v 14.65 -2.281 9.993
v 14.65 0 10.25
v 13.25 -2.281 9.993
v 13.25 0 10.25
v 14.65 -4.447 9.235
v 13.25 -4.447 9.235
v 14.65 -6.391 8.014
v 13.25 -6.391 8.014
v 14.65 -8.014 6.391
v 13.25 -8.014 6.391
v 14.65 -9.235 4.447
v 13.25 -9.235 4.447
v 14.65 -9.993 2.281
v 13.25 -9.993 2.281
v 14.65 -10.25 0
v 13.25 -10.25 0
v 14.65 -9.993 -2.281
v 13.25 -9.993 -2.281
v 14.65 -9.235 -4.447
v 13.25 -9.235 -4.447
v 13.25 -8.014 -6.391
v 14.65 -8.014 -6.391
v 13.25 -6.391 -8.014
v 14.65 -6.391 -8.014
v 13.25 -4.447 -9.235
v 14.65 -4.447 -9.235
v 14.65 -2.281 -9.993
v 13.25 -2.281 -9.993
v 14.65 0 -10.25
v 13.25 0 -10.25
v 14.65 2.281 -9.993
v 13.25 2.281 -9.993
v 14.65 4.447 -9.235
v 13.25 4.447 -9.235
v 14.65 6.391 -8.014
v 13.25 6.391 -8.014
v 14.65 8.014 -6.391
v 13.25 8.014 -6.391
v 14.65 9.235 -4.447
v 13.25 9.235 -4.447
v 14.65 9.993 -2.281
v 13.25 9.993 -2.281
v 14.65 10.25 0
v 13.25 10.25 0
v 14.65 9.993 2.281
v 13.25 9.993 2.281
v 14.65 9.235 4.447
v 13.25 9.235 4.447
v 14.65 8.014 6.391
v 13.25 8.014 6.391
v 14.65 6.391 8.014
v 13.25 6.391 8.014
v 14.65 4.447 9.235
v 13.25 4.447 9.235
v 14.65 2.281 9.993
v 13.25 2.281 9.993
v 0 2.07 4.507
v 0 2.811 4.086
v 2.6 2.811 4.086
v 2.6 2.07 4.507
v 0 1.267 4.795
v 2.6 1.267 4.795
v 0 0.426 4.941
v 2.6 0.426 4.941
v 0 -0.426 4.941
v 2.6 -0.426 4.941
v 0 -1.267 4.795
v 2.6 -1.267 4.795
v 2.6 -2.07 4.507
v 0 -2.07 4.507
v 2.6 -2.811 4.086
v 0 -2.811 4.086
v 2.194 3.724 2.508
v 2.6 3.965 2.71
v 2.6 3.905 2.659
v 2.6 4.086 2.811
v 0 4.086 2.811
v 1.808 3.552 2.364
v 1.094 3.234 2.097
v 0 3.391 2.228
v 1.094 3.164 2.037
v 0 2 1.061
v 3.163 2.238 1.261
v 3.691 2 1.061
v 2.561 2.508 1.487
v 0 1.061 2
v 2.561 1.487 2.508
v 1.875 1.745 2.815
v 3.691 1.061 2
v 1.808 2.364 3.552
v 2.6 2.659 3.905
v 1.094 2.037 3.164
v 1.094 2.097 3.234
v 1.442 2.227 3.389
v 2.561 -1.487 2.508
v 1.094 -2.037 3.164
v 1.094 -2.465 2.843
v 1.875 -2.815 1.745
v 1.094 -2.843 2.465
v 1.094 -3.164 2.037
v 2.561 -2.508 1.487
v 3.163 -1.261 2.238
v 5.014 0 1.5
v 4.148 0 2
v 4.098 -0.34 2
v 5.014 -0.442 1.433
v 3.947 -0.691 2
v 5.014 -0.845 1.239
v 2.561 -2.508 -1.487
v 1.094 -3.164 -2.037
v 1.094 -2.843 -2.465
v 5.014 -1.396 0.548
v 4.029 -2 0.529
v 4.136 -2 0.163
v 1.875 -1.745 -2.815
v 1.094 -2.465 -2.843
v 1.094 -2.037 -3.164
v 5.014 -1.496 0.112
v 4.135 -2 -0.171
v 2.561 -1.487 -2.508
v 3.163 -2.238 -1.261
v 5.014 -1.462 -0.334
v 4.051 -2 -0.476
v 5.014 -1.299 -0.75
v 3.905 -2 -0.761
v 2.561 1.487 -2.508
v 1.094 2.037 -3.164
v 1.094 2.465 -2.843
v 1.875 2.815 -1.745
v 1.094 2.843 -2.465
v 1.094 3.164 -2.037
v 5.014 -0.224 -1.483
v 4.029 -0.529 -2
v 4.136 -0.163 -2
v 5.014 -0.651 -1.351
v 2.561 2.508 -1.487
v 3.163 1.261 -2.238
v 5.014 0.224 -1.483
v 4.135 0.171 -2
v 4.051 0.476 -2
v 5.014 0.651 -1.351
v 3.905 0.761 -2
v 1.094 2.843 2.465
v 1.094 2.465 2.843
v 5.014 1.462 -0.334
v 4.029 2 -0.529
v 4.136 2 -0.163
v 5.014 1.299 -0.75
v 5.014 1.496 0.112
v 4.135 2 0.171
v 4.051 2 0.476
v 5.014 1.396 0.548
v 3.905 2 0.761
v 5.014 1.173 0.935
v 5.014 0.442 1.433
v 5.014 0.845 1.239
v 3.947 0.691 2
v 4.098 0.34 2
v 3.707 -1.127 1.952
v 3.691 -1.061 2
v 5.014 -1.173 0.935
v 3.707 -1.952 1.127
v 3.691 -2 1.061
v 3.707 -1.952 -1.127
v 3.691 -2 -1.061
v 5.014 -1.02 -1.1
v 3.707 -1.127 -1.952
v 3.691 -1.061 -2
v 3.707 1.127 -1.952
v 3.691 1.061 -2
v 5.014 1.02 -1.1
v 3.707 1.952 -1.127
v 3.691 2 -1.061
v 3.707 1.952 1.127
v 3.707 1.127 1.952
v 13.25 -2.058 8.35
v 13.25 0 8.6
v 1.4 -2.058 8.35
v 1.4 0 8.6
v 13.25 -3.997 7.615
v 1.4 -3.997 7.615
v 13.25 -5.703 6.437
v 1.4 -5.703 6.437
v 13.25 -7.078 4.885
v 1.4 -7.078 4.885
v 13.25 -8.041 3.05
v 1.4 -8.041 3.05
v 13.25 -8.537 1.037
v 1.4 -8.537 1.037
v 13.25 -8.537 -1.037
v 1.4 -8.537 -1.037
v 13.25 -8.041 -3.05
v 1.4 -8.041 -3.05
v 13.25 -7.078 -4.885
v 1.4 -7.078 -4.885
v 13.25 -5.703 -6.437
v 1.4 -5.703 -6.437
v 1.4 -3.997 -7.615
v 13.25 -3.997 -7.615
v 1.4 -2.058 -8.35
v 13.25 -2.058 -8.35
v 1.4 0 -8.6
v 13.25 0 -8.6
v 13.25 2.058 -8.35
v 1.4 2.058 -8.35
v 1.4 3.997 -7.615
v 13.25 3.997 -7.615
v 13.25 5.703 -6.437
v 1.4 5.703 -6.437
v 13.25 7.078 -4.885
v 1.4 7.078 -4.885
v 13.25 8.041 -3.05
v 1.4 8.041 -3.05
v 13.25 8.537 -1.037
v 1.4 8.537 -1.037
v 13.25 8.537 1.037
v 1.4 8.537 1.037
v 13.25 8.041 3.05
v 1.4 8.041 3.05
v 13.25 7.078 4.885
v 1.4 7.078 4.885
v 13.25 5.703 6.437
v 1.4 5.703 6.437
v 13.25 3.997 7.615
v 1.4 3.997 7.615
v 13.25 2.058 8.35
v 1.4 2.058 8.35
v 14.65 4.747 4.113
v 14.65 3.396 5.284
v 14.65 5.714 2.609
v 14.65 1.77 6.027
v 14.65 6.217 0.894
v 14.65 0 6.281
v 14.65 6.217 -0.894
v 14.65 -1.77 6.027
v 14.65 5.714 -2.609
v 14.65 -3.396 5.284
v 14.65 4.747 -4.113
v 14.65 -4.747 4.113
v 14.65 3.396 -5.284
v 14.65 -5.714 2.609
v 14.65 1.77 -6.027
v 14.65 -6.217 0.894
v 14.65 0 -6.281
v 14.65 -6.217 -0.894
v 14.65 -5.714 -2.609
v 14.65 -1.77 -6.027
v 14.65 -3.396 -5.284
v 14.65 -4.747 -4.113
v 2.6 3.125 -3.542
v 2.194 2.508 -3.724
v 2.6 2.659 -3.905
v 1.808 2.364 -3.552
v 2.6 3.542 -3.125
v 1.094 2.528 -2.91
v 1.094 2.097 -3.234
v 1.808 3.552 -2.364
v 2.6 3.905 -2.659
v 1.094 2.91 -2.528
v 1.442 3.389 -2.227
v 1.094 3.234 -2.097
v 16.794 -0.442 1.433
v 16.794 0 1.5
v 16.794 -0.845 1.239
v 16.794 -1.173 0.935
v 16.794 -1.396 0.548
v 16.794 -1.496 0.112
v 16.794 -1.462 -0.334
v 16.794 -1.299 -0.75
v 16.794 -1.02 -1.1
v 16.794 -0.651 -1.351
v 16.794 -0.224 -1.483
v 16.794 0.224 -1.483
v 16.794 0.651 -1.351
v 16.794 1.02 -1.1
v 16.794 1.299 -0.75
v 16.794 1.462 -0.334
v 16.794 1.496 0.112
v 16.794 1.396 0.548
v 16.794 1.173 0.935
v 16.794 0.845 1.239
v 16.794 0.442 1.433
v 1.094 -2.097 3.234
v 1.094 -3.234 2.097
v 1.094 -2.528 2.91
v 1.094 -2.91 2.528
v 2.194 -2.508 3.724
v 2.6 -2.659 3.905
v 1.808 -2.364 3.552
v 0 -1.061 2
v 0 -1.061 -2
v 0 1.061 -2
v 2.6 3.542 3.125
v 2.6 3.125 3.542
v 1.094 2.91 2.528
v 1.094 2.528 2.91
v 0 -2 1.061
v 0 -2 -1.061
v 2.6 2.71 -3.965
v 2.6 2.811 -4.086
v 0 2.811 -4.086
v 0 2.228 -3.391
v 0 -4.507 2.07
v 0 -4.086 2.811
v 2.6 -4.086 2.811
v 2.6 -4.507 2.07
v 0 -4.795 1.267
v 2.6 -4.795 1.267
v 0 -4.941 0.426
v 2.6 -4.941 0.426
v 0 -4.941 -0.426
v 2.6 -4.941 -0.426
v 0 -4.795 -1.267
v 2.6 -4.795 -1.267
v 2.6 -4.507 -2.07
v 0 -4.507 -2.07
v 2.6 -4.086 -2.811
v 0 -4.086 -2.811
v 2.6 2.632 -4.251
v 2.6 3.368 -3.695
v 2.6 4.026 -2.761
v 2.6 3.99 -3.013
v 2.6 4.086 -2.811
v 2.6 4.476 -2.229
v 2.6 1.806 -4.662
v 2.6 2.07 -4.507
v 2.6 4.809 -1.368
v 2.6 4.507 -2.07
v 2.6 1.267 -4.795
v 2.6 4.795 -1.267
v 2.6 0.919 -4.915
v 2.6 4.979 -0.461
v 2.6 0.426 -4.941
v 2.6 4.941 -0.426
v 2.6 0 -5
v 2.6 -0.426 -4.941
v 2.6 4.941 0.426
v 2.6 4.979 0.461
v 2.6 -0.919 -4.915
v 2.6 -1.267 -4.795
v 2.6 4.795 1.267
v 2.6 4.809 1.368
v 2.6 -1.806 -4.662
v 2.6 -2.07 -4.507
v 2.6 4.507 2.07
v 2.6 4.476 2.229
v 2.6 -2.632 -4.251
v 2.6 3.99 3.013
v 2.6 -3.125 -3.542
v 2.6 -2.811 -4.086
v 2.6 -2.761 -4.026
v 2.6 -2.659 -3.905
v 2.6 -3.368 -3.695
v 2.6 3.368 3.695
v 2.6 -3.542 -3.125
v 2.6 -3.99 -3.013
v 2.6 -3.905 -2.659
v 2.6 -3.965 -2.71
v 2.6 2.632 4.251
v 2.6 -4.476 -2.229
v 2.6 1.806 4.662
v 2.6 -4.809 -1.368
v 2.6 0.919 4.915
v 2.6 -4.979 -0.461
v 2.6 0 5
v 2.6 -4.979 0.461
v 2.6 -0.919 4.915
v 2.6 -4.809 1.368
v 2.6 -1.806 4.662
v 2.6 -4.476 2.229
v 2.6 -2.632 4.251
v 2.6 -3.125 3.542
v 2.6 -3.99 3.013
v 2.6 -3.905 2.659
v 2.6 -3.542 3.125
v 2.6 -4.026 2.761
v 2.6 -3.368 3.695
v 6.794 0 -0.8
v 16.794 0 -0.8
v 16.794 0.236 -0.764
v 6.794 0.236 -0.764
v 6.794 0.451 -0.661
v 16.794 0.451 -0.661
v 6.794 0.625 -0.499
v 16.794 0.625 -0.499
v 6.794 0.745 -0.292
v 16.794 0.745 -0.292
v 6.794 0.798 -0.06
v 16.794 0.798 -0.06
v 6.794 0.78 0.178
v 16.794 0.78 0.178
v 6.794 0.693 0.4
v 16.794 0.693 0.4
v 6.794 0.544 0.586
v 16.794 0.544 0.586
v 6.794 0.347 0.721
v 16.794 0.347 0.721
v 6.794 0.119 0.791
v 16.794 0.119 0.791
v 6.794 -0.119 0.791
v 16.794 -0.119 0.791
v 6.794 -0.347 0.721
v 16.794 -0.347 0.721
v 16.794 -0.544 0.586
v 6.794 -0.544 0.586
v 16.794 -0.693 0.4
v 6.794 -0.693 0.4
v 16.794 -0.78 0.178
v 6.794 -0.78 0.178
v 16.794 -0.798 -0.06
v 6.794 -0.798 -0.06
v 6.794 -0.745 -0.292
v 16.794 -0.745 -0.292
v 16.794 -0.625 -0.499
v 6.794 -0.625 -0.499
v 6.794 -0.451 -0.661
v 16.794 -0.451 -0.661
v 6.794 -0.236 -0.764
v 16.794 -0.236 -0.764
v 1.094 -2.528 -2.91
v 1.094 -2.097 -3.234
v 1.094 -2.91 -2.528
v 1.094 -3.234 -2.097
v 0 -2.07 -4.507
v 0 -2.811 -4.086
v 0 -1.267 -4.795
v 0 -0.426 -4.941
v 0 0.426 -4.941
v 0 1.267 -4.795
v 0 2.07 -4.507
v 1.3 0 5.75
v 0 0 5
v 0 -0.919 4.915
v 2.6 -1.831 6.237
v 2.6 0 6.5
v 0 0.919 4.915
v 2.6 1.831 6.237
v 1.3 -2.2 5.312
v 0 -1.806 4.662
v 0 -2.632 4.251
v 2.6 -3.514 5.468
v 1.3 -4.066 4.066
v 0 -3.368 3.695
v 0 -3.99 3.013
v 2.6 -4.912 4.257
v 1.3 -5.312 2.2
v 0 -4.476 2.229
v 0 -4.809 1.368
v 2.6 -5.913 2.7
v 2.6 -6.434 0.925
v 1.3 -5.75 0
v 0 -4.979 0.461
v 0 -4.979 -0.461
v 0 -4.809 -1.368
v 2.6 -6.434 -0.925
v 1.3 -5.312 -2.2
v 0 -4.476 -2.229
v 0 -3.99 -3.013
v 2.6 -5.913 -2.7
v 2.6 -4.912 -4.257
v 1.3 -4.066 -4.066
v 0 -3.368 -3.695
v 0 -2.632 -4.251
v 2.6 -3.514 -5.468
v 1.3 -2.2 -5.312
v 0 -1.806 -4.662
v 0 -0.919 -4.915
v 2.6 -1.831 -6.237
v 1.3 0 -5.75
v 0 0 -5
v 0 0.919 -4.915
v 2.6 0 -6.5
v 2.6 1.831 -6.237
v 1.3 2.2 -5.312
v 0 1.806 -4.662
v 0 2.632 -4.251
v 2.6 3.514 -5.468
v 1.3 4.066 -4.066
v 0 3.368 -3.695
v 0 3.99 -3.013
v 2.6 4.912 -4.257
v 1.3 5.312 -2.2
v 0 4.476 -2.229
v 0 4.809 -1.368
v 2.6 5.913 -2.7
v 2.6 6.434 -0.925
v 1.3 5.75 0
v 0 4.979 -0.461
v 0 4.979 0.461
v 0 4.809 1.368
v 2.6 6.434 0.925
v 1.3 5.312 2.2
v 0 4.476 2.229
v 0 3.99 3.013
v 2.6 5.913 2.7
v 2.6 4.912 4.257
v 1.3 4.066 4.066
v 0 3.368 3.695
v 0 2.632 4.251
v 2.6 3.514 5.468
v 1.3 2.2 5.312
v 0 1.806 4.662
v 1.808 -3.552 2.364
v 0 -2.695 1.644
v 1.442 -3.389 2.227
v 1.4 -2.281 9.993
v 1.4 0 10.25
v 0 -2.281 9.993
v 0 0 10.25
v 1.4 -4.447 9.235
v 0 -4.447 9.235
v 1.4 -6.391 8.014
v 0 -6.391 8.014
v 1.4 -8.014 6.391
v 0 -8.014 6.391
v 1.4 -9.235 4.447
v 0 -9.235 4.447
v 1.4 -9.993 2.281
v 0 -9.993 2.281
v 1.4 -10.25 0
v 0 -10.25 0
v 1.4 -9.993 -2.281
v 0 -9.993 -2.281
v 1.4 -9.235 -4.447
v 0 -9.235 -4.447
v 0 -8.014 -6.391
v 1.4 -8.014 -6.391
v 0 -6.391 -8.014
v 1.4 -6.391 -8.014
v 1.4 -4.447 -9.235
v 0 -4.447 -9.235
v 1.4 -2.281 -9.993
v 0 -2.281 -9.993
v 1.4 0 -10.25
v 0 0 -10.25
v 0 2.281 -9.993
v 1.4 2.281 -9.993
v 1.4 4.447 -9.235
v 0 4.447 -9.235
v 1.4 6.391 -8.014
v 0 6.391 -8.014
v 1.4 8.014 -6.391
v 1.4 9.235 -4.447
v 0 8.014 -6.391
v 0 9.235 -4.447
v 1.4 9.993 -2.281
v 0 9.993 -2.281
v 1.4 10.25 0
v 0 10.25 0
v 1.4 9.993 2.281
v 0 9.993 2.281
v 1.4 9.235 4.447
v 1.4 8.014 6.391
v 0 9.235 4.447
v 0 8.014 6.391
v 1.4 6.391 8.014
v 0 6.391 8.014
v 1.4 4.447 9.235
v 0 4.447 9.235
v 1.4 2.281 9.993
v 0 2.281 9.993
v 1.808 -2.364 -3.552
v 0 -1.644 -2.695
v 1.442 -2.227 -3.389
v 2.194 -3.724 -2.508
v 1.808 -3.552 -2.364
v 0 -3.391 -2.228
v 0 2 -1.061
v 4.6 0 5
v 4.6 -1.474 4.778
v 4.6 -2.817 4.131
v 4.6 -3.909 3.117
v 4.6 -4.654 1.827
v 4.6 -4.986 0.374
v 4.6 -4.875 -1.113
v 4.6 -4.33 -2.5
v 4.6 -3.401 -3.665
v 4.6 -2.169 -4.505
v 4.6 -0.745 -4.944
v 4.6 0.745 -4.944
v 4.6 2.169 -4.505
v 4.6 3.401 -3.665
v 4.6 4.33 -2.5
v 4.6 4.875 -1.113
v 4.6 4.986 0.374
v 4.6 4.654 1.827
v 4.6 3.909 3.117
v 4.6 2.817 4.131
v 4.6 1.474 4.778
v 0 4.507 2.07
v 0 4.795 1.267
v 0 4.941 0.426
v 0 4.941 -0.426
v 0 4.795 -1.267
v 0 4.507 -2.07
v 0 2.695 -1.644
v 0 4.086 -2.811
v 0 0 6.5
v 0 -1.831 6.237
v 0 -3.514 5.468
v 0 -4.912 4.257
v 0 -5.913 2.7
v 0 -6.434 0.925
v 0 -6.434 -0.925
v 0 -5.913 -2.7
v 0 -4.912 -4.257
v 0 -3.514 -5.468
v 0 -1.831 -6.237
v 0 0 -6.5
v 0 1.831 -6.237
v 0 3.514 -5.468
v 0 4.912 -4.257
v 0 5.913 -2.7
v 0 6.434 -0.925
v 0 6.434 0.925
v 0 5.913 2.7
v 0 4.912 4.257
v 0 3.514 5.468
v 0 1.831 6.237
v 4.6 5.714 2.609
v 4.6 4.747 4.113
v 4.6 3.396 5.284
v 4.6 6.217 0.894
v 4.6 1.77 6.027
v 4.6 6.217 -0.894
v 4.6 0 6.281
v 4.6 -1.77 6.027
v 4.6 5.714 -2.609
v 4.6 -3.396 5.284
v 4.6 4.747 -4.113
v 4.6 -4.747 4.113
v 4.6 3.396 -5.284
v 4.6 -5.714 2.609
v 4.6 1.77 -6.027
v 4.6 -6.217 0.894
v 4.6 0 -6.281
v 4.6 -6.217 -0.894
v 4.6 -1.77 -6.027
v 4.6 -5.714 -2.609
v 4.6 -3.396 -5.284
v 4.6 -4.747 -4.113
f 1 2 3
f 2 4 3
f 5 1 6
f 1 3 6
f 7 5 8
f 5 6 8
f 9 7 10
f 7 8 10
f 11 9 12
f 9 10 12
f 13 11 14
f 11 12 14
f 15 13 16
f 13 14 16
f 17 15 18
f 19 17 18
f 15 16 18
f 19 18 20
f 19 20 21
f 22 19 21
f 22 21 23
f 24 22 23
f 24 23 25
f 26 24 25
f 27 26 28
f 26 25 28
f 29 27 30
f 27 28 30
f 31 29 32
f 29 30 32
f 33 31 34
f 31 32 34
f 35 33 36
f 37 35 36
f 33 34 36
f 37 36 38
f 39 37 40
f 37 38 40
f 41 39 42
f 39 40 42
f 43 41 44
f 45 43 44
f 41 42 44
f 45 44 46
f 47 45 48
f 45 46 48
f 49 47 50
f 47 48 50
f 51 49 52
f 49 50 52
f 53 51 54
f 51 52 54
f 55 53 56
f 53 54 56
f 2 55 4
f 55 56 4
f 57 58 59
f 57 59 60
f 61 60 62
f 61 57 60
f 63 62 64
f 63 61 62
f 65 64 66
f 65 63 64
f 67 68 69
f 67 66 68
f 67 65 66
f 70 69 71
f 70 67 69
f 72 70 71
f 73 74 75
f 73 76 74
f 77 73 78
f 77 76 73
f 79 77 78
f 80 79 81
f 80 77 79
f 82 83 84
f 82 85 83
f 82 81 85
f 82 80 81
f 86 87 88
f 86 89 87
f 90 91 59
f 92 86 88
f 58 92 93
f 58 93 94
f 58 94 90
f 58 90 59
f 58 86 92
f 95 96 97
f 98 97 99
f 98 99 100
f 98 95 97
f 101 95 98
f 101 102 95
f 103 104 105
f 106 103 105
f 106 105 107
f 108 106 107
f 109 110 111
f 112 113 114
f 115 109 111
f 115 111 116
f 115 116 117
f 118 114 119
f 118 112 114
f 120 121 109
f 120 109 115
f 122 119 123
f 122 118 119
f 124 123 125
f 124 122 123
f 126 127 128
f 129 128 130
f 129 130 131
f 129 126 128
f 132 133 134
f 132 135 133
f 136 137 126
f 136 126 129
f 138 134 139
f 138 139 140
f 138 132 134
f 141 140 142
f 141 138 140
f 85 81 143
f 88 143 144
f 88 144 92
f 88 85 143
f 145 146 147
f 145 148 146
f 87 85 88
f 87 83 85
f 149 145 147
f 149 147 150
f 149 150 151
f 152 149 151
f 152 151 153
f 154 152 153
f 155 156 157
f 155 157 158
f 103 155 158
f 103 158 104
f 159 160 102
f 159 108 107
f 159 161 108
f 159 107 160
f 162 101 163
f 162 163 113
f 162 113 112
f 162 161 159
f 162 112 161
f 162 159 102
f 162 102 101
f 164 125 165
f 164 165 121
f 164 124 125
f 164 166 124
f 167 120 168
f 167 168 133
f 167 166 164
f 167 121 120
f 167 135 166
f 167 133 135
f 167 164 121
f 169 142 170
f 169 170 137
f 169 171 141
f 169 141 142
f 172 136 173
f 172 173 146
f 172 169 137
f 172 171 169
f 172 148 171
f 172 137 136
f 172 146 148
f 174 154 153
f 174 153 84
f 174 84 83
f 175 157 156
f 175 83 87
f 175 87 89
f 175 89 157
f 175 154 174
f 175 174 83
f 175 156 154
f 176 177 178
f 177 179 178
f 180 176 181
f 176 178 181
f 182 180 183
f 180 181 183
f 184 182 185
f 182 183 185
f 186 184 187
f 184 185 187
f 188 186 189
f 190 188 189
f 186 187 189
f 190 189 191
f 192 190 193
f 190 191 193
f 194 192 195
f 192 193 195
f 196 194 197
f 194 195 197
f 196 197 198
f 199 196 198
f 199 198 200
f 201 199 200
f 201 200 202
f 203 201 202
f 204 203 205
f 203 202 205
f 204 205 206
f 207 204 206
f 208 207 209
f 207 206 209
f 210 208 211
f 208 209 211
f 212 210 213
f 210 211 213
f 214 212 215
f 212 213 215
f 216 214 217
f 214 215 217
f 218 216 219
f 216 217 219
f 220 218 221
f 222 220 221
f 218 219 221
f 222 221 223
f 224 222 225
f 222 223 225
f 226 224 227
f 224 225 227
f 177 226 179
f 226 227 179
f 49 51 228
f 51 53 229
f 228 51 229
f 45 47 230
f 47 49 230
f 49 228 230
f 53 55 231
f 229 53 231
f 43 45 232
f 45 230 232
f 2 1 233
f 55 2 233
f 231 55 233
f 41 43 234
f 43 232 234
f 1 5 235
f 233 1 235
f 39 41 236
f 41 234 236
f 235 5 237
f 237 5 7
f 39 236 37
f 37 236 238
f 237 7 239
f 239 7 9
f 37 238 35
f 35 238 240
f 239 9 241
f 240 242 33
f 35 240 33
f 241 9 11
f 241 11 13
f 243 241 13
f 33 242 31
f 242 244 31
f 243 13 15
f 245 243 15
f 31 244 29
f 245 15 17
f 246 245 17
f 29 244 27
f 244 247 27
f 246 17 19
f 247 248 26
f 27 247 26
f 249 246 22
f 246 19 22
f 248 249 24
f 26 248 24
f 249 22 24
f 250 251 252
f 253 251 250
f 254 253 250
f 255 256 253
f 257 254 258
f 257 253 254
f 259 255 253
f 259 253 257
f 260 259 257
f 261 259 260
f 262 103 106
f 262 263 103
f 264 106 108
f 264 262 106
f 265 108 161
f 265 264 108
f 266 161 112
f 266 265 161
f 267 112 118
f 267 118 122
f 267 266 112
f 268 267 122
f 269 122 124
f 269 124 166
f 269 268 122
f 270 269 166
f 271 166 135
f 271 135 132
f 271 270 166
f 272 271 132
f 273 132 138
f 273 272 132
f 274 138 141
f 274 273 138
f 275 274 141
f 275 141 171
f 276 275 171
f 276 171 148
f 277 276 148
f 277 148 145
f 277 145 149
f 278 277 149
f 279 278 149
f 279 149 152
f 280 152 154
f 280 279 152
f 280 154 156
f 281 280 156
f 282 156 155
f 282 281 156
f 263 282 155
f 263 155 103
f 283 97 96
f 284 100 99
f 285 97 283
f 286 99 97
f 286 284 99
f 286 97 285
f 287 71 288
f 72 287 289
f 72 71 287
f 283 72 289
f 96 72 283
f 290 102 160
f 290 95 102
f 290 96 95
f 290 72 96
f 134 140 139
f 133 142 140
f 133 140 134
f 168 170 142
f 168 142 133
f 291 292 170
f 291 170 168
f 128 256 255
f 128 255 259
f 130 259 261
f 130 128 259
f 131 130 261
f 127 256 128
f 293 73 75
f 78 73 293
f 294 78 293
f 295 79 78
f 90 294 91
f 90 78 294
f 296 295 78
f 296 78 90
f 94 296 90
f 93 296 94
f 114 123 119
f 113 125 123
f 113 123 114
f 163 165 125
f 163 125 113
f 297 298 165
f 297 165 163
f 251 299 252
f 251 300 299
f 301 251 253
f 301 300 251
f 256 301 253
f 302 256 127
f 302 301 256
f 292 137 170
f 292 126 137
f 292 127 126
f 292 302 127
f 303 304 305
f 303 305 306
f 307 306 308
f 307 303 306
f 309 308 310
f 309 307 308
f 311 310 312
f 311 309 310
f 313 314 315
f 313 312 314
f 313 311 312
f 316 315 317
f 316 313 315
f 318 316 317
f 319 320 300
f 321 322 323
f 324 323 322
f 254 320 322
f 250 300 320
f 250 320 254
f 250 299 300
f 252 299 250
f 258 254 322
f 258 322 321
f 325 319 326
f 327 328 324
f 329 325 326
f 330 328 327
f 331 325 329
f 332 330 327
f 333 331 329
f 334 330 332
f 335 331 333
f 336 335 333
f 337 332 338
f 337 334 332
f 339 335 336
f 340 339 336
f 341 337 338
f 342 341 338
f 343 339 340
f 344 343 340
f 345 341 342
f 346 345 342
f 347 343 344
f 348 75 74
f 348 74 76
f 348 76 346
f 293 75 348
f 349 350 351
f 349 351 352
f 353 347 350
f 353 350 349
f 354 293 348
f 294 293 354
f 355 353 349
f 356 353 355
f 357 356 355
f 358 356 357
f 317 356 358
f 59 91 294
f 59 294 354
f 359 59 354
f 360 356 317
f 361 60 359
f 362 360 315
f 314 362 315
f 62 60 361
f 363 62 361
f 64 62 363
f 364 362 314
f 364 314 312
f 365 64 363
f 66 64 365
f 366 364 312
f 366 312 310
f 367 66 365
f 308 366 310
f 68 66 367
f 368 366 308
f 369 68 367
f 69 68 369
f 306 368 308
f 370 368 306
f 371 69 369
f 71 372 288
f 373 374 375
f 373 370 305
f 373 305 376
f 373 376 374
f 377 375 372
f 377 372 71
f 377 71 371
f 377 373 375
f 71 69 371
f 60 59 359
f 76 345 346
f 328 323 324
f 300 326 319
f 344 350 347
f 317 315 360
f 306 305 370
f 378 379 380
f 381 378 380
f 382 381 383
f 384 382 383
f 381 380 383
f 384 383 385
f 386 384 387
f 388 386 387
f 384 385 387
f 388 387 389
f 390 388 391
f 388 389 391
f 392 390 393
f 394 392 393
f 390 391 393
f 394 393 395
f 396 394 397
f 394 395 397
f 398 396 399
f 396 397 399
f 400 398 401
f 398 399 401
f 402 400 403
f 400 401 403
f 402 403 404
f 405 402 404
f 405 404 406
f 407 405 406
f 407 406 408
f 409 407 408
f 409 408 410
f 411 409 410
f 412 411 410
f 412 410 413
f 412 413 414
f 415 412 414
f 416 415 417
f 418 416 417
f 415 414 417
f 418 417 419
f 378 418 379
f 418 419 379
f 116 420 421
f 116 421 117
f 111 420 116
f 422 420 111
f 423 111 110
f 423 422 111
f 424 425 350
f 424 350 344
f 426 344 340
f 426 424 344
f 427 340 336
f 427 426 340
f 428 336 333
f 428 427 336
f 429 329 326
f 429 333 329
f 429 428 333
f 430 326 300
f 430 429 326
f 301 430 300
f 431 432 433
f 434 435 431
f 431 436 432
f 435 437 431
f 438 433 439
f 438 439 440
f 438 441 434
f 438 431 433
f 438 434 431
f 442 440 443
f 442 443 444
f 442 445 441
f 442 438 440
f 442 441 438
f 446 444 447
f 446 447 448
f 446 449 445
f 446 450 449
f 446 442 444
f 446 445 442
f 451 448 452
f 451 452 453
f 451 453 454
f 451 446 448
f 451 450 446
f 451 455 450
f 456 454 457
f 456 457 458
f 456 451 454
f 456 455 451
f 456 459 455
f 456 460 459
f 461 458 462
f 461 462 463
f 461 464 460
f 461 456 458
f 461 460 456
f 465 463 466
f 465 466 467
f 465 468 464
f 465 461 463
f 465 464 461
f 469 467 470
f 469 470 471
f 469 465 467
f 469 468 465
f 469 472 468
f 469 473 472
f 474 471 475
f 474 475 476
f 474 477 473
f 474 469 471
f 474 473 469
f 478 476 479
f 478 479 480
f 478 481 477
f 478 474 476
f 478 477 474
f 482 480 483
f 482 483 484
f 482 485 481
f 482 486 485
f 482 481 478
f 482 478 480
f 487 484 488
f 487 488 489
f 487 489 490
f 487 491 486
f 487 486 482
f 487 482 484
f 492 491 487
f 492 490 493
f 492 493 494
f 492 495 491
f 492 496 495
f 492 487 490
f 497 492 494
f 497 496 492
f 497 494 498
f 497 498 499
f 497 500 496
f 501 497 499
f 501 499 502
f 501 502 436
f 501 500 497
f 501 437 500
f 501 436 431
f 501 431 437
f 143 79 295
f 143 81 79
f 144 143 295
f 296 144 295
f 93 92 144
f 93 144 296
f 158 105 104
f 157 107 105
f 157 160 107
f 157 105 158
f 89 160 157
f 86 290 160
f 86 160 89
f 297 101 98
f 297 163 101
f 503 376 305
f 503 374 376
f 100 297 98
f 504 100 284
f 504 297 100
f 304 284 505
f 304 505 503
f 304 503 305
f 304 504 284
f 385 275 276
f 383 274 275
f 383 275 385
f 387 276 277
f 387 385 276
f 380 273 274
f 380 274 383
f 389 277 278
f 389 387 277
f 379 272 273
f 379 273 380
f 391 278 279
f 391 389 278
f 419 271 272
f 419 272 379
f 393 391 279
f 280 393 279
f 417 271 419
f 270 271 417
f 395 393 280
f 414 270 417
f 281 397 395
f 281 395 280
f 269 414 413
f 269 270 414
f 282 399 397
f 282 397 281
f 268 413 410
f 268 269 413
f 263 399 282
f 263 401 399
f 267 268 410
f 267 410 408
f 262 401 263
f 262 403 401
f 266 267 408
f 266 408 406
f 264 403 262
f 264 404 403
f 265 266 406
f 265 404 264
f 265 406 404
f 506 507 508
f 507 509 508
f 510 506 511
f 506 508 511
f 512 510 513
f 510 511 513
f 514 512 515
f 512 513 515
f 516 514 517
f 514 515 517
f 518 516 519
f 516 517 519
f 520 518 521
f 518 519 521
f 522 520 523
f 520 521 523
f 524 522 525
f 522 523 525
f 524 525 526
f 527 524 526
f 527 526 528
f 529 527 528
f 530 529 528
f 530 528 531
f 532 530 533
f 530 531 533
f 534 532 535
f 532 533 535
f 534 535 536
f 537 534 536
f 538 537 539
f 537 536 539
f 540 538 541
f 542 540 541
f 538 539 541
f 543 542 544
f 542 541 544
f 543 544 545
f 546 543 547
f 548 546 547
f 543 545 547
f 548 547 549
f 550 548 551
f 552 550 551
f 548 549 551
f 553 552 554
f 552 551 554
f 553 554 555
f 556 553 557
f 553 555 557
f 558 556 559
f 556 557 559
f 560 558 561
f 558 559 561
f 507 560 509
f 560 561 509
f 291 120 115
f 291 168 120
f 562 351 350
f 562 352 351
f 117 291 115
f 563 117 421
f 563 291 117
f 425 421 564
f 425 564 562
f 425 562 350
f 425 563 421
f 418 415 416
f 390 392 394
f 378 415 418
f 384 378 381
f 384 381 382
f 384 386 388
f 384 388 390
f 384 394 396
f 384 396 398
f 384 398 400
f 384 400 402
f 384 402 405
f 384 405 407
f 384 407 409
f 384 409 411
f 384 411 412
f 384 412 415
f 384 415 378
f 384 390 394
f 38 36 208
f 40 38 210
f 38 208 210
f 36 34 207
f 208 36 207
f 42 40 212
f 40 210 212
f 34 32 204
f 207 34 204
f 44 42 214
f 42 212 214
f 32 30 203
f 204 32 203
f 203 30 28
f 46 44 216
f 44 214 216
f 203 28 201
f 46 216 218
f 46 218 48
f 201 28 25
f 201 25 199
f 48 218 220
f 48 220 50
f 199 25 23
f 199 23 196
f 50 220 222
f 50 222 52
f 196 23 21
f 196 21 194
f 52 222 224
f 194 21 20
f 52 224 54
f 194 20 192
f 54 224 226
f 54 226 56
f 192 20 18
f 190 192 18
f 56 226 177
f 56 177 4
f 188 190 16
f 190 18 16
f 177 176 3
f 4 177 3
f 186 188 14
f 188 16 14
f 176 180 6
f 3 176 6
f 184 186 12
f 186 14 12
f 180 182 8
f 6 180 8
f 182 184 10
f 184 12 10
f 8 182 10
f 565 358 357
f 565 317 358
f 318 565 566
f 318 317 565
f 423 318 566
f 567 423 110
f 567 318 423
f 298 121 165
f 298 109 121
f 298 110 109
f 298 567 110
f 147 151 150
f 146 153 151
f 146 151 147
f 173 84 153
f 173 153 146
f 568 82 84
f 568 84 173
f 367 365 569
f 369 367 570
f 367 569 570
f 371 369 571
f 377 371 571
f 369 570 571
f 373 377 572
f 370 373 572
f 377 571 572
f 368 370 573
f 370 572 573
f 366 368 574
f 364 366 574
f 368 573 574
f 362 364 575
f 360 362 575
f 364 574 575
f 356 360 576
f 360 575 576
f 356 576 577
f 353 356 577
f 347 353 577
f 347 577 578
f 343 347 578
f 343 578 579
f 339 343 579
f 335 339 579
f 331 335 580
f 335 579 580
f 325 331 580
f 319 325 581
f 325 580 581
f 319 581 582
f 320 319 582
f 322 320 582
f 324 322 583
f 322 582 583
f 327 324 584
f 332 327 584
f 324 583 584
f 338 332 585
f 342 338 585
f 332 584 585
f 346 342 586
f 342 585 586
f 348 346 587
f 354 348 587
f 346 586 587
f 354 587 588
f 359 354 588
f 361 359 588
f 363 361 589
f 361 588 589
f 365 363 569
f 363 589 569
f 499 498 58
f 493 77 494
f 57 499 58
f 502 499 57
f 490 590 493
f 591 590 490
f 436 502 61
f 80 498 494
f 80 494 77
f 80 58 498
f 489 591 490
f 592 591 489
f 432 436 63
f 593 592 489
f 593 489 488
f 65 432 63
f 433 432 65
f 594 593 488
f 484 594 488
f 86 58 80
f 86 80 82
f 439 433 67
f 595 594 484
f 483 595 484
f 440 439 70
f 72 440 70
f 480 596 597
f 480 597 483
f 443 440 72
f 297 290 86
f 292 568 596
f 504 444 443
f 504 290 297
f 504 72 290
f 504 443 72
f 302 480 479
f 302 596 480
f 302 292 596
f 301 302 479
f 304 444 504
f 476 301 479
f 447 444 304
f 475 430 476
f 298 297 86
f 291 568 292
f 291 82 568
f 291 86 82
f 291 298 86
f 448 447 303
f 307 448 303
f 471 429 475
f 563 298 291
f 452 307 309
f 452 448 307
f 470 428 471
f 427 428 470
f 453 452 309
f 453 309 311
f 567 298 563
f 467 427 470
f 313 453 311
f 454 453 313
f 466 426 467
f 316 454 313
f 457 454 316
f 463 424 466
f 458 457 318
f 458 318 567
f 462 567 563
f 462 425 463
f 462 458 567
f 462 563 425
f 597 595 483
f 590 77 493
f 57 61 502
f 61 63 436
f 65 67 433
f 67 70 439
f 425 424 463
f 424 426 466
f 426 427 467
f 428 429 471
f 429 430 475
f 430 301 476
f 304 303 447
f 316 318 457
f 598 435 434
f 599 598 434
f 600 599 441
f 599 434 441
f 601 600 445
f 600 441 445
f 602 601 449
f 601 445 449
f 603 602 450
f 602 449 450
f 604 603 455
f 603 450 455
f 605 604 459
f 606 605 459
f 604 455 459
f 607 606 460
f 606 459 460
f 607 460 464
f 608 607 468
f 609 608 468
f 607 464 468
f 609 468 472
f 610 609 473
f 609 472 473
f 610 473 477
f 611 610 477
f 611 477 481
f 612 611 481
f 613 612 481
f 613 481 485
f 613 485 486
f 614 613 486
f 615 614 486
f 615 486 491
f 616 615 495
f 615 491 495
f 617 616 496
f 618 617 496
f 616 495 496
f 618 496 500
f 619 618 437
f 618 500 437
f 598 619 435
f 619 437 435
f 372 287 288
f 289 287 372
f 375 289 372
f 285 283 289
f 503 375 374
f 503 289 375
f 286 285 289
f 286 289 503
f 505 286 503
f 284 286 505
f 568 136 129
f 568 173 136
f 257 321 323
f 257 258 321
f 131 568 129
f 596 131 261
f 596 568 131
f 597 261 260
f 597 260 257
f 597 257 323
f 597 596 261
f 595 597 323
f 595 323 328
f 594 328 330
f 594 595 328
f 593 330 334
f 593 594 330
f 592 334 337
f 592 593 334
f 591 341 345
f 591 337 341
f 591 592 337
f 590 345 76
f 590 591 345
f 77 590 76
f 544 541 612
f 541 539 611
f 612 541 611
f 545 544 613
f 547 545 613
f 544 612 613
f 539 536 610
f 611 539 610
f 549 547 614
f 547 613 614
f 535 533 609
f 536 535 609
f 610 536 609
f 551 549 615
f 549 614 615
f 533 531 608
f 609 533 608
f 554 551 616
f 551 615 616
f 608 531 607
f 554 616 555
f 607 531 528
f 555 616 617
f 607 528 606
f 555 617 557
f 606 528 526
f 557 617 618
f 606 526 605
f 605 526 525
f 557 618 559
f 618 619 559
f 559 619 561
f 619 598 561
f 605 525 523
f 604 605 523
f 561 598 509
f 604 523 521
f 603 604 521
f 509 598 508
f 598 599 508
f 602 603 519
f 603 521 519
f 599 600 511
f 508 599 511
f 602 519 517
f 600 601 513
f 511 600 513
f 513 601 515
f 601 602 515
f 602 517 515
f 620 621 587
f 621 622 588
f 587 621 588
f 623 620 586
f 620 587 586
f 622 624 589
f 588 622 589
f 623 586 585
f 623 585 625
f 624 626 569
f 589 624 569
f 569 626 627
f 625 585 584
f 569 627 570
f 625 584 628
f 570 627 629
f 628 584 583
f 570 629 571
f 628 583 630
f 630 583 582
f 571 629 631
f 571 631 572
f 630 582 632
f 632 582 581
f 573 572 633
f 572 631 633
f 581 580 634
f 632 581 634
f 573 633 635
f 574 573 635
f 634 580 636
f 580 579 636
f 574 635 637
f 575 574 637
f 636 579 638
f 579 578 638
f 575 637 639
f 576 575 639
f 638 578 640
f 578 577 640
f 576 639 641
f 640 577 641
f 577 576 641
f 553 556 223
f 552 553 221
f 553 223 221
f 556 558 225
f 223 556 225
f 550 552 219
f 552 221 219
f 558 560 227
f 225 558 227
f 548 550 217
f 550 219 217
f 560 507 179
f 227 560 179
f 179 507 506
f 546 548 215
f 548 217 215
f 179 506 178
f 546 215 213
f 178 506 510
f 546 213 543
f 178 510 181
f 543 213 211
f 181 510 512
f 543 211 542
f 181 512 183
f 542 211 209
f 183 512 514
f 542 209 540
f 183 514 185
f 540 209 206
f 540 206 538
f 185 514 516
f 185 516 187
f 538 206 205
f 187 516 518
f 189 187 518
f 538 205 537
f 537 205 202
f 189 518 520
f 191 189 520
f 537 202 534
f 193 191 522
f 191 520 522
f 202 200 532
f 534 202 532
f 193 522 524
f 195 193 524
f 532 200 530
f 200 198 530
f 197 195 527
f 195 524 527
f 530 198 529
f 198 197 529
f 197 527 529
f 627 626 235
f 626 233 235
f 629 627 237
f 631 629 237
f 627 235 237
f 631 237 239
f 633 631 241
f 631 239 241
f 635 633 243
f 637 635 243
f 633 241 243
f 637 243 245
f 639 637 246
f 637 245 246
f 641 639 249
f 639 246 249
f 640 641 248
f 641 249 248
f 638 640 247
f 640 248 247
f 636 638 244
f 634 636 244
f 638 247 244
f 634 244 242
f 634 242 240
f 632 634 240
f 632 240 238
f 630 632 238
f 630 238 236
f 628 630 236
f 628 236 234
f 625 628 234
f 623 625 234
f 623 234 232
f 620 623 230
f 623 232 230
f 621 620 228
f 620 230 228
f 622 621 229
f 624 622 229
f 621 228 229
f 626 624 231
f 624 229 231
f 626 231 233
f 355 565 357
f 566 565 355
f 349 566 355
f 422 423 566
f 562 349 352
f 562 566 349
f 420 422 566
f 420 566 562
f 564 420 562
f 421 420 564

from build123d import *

# Parameters (mm, degrees)
SKETCH6_R          = 0.8
CUT_EXTRUDE1_DEPTH = 10
CUT_EXTRUDE2_DEPTH = 10


with BuildPart() as part:
    # Sketch1 → Revolve1 (revolve)
    with BuildSketch(Plane.XY, mode=Mode.PRIVATE) as revolve1_sk:
        Polygon((0, 10.25), (0, 6.5), (2.6, 6.5), (2.6, 5), (4.6, 5), (4.6, 6.281355932), (14.65, 6.281355932), (14.65, 10.25), (13.25, 10.25), (13.25, 8.6), (1.4, 8.6), (1.4, 10.25), align=None)
    revolve(revolve1_sk.sketch.rotate(Axis((0, 0, 0), (1, 0, 0)), 90), axis=Axis((0, 0, 0), (1, 0, 0)))



with BuildPart() as body_2:
    # Sketch3 → Revolve2 (revolve)
    with BuildSketch(Plane.XY, mode=Mode.PRIVATE) as revolve2_sk:
        Polygon((1.094302339, 0), (1.094302339, 3.76292134), (5.013797074, 1.5), (16.794302339, 1.5), (16.794302339, 0), align=None)
    revolve(revolve2_sk.sketch.rotate(Axis((0, 0, 0), (1, 0, 0)), 90), axis=Axis((0, 0, 0), (1, 0, 0)))

    # Sketch6 → Cut-Extrude1 (cut)
    with BuildSketch(Plane(origin=(16.794302339, 0, 0), x_dir=(0, 0, -1), z_dir=(1, 0, 0))):
        Circle(SKETCH6_R)
    extrude(amount=-CUT_EXTRUDE1_DEPTH, mode=Mode.SUBTRACT)


with BuildPart() as part_1:
    add(part.part)

    add(body_2.part)  # Revolve3 merges body 2
    # Sketch8 → Revolve3 (revolve)
    with BuildSketch(Plane.XY, mode=Mode.PRIVATE) as revolve3_sk:
        Polygon((0, 0), (0, 5), (2.6, 6.5), (2.6, 4.723965443), (1.094302339, 3.854650493), (1.094302339, 0), align=None)
    revolve(revolve3_sk.sketch.rotate(Axis((0, 0, 0), (1, 0, 0)), 90), axis=Axis((0, 0, 0), (1, 0, 0)))

    # Sketch9 → Cut-Extrude2 (cut)
    with BuildSketch(Plane.ZY):
        with BuildLine():
            Line((1.060952343, 2), (-1.060952343, 2))
            Line((-1.060952343, 2), (-2.811396527, 4.086098145))
            ThreePointArc((-2.811396527, 4.086098145), (0, 4.959853676), (2.811396527, 4.086098145))
            Line((2.811396527, 4.086098145), (1.060952343, 2))
        make_face()
        with BuildLine():
            Line((2, 1.060952343), (4.086098145, 2.811396527))
            ThreePointArc((4.086098145, 2.811396527), (4.959853676, 0), (4.086098145, -2.811396527))
            Line((4.086098145, -2.811396527), (2, -1.060952343))
            Line((2, -1.060952343), (2, 1.060952343))
        make_face()
        with BuildLine():
            Line((1.060952343, -2), (2.811396527, -4.086098145))
            ThreePointArc((2.811396527, -4.086098145), (0, -4.959853676), (-2.811396527, -4.086098145))
            Line((-2.811396527, -4.086098145), (-1.060952343, -2))
            Line((-1.060952343, -2), (1.060952343, -2))
        make_face()
        with BuildLine():
            Line((-2, -1.060952343), (-4.086098145, -2.811396527))
            ThreePointArc((-4.086098145, -2.811396527), (-4.959853676, 0), (-4.086098145, 2.811396527))
            Line((-4.086098145, 2.811396527), (-2, 1.060952343))
            Line((-2, 1.060952343), (-2, -1.060952343))
        make_face()
    extrude(amount=-CUT_EXTRUDE2_DEPTH, mode=Mode.SUBTRACT)


solid = part_1.part
